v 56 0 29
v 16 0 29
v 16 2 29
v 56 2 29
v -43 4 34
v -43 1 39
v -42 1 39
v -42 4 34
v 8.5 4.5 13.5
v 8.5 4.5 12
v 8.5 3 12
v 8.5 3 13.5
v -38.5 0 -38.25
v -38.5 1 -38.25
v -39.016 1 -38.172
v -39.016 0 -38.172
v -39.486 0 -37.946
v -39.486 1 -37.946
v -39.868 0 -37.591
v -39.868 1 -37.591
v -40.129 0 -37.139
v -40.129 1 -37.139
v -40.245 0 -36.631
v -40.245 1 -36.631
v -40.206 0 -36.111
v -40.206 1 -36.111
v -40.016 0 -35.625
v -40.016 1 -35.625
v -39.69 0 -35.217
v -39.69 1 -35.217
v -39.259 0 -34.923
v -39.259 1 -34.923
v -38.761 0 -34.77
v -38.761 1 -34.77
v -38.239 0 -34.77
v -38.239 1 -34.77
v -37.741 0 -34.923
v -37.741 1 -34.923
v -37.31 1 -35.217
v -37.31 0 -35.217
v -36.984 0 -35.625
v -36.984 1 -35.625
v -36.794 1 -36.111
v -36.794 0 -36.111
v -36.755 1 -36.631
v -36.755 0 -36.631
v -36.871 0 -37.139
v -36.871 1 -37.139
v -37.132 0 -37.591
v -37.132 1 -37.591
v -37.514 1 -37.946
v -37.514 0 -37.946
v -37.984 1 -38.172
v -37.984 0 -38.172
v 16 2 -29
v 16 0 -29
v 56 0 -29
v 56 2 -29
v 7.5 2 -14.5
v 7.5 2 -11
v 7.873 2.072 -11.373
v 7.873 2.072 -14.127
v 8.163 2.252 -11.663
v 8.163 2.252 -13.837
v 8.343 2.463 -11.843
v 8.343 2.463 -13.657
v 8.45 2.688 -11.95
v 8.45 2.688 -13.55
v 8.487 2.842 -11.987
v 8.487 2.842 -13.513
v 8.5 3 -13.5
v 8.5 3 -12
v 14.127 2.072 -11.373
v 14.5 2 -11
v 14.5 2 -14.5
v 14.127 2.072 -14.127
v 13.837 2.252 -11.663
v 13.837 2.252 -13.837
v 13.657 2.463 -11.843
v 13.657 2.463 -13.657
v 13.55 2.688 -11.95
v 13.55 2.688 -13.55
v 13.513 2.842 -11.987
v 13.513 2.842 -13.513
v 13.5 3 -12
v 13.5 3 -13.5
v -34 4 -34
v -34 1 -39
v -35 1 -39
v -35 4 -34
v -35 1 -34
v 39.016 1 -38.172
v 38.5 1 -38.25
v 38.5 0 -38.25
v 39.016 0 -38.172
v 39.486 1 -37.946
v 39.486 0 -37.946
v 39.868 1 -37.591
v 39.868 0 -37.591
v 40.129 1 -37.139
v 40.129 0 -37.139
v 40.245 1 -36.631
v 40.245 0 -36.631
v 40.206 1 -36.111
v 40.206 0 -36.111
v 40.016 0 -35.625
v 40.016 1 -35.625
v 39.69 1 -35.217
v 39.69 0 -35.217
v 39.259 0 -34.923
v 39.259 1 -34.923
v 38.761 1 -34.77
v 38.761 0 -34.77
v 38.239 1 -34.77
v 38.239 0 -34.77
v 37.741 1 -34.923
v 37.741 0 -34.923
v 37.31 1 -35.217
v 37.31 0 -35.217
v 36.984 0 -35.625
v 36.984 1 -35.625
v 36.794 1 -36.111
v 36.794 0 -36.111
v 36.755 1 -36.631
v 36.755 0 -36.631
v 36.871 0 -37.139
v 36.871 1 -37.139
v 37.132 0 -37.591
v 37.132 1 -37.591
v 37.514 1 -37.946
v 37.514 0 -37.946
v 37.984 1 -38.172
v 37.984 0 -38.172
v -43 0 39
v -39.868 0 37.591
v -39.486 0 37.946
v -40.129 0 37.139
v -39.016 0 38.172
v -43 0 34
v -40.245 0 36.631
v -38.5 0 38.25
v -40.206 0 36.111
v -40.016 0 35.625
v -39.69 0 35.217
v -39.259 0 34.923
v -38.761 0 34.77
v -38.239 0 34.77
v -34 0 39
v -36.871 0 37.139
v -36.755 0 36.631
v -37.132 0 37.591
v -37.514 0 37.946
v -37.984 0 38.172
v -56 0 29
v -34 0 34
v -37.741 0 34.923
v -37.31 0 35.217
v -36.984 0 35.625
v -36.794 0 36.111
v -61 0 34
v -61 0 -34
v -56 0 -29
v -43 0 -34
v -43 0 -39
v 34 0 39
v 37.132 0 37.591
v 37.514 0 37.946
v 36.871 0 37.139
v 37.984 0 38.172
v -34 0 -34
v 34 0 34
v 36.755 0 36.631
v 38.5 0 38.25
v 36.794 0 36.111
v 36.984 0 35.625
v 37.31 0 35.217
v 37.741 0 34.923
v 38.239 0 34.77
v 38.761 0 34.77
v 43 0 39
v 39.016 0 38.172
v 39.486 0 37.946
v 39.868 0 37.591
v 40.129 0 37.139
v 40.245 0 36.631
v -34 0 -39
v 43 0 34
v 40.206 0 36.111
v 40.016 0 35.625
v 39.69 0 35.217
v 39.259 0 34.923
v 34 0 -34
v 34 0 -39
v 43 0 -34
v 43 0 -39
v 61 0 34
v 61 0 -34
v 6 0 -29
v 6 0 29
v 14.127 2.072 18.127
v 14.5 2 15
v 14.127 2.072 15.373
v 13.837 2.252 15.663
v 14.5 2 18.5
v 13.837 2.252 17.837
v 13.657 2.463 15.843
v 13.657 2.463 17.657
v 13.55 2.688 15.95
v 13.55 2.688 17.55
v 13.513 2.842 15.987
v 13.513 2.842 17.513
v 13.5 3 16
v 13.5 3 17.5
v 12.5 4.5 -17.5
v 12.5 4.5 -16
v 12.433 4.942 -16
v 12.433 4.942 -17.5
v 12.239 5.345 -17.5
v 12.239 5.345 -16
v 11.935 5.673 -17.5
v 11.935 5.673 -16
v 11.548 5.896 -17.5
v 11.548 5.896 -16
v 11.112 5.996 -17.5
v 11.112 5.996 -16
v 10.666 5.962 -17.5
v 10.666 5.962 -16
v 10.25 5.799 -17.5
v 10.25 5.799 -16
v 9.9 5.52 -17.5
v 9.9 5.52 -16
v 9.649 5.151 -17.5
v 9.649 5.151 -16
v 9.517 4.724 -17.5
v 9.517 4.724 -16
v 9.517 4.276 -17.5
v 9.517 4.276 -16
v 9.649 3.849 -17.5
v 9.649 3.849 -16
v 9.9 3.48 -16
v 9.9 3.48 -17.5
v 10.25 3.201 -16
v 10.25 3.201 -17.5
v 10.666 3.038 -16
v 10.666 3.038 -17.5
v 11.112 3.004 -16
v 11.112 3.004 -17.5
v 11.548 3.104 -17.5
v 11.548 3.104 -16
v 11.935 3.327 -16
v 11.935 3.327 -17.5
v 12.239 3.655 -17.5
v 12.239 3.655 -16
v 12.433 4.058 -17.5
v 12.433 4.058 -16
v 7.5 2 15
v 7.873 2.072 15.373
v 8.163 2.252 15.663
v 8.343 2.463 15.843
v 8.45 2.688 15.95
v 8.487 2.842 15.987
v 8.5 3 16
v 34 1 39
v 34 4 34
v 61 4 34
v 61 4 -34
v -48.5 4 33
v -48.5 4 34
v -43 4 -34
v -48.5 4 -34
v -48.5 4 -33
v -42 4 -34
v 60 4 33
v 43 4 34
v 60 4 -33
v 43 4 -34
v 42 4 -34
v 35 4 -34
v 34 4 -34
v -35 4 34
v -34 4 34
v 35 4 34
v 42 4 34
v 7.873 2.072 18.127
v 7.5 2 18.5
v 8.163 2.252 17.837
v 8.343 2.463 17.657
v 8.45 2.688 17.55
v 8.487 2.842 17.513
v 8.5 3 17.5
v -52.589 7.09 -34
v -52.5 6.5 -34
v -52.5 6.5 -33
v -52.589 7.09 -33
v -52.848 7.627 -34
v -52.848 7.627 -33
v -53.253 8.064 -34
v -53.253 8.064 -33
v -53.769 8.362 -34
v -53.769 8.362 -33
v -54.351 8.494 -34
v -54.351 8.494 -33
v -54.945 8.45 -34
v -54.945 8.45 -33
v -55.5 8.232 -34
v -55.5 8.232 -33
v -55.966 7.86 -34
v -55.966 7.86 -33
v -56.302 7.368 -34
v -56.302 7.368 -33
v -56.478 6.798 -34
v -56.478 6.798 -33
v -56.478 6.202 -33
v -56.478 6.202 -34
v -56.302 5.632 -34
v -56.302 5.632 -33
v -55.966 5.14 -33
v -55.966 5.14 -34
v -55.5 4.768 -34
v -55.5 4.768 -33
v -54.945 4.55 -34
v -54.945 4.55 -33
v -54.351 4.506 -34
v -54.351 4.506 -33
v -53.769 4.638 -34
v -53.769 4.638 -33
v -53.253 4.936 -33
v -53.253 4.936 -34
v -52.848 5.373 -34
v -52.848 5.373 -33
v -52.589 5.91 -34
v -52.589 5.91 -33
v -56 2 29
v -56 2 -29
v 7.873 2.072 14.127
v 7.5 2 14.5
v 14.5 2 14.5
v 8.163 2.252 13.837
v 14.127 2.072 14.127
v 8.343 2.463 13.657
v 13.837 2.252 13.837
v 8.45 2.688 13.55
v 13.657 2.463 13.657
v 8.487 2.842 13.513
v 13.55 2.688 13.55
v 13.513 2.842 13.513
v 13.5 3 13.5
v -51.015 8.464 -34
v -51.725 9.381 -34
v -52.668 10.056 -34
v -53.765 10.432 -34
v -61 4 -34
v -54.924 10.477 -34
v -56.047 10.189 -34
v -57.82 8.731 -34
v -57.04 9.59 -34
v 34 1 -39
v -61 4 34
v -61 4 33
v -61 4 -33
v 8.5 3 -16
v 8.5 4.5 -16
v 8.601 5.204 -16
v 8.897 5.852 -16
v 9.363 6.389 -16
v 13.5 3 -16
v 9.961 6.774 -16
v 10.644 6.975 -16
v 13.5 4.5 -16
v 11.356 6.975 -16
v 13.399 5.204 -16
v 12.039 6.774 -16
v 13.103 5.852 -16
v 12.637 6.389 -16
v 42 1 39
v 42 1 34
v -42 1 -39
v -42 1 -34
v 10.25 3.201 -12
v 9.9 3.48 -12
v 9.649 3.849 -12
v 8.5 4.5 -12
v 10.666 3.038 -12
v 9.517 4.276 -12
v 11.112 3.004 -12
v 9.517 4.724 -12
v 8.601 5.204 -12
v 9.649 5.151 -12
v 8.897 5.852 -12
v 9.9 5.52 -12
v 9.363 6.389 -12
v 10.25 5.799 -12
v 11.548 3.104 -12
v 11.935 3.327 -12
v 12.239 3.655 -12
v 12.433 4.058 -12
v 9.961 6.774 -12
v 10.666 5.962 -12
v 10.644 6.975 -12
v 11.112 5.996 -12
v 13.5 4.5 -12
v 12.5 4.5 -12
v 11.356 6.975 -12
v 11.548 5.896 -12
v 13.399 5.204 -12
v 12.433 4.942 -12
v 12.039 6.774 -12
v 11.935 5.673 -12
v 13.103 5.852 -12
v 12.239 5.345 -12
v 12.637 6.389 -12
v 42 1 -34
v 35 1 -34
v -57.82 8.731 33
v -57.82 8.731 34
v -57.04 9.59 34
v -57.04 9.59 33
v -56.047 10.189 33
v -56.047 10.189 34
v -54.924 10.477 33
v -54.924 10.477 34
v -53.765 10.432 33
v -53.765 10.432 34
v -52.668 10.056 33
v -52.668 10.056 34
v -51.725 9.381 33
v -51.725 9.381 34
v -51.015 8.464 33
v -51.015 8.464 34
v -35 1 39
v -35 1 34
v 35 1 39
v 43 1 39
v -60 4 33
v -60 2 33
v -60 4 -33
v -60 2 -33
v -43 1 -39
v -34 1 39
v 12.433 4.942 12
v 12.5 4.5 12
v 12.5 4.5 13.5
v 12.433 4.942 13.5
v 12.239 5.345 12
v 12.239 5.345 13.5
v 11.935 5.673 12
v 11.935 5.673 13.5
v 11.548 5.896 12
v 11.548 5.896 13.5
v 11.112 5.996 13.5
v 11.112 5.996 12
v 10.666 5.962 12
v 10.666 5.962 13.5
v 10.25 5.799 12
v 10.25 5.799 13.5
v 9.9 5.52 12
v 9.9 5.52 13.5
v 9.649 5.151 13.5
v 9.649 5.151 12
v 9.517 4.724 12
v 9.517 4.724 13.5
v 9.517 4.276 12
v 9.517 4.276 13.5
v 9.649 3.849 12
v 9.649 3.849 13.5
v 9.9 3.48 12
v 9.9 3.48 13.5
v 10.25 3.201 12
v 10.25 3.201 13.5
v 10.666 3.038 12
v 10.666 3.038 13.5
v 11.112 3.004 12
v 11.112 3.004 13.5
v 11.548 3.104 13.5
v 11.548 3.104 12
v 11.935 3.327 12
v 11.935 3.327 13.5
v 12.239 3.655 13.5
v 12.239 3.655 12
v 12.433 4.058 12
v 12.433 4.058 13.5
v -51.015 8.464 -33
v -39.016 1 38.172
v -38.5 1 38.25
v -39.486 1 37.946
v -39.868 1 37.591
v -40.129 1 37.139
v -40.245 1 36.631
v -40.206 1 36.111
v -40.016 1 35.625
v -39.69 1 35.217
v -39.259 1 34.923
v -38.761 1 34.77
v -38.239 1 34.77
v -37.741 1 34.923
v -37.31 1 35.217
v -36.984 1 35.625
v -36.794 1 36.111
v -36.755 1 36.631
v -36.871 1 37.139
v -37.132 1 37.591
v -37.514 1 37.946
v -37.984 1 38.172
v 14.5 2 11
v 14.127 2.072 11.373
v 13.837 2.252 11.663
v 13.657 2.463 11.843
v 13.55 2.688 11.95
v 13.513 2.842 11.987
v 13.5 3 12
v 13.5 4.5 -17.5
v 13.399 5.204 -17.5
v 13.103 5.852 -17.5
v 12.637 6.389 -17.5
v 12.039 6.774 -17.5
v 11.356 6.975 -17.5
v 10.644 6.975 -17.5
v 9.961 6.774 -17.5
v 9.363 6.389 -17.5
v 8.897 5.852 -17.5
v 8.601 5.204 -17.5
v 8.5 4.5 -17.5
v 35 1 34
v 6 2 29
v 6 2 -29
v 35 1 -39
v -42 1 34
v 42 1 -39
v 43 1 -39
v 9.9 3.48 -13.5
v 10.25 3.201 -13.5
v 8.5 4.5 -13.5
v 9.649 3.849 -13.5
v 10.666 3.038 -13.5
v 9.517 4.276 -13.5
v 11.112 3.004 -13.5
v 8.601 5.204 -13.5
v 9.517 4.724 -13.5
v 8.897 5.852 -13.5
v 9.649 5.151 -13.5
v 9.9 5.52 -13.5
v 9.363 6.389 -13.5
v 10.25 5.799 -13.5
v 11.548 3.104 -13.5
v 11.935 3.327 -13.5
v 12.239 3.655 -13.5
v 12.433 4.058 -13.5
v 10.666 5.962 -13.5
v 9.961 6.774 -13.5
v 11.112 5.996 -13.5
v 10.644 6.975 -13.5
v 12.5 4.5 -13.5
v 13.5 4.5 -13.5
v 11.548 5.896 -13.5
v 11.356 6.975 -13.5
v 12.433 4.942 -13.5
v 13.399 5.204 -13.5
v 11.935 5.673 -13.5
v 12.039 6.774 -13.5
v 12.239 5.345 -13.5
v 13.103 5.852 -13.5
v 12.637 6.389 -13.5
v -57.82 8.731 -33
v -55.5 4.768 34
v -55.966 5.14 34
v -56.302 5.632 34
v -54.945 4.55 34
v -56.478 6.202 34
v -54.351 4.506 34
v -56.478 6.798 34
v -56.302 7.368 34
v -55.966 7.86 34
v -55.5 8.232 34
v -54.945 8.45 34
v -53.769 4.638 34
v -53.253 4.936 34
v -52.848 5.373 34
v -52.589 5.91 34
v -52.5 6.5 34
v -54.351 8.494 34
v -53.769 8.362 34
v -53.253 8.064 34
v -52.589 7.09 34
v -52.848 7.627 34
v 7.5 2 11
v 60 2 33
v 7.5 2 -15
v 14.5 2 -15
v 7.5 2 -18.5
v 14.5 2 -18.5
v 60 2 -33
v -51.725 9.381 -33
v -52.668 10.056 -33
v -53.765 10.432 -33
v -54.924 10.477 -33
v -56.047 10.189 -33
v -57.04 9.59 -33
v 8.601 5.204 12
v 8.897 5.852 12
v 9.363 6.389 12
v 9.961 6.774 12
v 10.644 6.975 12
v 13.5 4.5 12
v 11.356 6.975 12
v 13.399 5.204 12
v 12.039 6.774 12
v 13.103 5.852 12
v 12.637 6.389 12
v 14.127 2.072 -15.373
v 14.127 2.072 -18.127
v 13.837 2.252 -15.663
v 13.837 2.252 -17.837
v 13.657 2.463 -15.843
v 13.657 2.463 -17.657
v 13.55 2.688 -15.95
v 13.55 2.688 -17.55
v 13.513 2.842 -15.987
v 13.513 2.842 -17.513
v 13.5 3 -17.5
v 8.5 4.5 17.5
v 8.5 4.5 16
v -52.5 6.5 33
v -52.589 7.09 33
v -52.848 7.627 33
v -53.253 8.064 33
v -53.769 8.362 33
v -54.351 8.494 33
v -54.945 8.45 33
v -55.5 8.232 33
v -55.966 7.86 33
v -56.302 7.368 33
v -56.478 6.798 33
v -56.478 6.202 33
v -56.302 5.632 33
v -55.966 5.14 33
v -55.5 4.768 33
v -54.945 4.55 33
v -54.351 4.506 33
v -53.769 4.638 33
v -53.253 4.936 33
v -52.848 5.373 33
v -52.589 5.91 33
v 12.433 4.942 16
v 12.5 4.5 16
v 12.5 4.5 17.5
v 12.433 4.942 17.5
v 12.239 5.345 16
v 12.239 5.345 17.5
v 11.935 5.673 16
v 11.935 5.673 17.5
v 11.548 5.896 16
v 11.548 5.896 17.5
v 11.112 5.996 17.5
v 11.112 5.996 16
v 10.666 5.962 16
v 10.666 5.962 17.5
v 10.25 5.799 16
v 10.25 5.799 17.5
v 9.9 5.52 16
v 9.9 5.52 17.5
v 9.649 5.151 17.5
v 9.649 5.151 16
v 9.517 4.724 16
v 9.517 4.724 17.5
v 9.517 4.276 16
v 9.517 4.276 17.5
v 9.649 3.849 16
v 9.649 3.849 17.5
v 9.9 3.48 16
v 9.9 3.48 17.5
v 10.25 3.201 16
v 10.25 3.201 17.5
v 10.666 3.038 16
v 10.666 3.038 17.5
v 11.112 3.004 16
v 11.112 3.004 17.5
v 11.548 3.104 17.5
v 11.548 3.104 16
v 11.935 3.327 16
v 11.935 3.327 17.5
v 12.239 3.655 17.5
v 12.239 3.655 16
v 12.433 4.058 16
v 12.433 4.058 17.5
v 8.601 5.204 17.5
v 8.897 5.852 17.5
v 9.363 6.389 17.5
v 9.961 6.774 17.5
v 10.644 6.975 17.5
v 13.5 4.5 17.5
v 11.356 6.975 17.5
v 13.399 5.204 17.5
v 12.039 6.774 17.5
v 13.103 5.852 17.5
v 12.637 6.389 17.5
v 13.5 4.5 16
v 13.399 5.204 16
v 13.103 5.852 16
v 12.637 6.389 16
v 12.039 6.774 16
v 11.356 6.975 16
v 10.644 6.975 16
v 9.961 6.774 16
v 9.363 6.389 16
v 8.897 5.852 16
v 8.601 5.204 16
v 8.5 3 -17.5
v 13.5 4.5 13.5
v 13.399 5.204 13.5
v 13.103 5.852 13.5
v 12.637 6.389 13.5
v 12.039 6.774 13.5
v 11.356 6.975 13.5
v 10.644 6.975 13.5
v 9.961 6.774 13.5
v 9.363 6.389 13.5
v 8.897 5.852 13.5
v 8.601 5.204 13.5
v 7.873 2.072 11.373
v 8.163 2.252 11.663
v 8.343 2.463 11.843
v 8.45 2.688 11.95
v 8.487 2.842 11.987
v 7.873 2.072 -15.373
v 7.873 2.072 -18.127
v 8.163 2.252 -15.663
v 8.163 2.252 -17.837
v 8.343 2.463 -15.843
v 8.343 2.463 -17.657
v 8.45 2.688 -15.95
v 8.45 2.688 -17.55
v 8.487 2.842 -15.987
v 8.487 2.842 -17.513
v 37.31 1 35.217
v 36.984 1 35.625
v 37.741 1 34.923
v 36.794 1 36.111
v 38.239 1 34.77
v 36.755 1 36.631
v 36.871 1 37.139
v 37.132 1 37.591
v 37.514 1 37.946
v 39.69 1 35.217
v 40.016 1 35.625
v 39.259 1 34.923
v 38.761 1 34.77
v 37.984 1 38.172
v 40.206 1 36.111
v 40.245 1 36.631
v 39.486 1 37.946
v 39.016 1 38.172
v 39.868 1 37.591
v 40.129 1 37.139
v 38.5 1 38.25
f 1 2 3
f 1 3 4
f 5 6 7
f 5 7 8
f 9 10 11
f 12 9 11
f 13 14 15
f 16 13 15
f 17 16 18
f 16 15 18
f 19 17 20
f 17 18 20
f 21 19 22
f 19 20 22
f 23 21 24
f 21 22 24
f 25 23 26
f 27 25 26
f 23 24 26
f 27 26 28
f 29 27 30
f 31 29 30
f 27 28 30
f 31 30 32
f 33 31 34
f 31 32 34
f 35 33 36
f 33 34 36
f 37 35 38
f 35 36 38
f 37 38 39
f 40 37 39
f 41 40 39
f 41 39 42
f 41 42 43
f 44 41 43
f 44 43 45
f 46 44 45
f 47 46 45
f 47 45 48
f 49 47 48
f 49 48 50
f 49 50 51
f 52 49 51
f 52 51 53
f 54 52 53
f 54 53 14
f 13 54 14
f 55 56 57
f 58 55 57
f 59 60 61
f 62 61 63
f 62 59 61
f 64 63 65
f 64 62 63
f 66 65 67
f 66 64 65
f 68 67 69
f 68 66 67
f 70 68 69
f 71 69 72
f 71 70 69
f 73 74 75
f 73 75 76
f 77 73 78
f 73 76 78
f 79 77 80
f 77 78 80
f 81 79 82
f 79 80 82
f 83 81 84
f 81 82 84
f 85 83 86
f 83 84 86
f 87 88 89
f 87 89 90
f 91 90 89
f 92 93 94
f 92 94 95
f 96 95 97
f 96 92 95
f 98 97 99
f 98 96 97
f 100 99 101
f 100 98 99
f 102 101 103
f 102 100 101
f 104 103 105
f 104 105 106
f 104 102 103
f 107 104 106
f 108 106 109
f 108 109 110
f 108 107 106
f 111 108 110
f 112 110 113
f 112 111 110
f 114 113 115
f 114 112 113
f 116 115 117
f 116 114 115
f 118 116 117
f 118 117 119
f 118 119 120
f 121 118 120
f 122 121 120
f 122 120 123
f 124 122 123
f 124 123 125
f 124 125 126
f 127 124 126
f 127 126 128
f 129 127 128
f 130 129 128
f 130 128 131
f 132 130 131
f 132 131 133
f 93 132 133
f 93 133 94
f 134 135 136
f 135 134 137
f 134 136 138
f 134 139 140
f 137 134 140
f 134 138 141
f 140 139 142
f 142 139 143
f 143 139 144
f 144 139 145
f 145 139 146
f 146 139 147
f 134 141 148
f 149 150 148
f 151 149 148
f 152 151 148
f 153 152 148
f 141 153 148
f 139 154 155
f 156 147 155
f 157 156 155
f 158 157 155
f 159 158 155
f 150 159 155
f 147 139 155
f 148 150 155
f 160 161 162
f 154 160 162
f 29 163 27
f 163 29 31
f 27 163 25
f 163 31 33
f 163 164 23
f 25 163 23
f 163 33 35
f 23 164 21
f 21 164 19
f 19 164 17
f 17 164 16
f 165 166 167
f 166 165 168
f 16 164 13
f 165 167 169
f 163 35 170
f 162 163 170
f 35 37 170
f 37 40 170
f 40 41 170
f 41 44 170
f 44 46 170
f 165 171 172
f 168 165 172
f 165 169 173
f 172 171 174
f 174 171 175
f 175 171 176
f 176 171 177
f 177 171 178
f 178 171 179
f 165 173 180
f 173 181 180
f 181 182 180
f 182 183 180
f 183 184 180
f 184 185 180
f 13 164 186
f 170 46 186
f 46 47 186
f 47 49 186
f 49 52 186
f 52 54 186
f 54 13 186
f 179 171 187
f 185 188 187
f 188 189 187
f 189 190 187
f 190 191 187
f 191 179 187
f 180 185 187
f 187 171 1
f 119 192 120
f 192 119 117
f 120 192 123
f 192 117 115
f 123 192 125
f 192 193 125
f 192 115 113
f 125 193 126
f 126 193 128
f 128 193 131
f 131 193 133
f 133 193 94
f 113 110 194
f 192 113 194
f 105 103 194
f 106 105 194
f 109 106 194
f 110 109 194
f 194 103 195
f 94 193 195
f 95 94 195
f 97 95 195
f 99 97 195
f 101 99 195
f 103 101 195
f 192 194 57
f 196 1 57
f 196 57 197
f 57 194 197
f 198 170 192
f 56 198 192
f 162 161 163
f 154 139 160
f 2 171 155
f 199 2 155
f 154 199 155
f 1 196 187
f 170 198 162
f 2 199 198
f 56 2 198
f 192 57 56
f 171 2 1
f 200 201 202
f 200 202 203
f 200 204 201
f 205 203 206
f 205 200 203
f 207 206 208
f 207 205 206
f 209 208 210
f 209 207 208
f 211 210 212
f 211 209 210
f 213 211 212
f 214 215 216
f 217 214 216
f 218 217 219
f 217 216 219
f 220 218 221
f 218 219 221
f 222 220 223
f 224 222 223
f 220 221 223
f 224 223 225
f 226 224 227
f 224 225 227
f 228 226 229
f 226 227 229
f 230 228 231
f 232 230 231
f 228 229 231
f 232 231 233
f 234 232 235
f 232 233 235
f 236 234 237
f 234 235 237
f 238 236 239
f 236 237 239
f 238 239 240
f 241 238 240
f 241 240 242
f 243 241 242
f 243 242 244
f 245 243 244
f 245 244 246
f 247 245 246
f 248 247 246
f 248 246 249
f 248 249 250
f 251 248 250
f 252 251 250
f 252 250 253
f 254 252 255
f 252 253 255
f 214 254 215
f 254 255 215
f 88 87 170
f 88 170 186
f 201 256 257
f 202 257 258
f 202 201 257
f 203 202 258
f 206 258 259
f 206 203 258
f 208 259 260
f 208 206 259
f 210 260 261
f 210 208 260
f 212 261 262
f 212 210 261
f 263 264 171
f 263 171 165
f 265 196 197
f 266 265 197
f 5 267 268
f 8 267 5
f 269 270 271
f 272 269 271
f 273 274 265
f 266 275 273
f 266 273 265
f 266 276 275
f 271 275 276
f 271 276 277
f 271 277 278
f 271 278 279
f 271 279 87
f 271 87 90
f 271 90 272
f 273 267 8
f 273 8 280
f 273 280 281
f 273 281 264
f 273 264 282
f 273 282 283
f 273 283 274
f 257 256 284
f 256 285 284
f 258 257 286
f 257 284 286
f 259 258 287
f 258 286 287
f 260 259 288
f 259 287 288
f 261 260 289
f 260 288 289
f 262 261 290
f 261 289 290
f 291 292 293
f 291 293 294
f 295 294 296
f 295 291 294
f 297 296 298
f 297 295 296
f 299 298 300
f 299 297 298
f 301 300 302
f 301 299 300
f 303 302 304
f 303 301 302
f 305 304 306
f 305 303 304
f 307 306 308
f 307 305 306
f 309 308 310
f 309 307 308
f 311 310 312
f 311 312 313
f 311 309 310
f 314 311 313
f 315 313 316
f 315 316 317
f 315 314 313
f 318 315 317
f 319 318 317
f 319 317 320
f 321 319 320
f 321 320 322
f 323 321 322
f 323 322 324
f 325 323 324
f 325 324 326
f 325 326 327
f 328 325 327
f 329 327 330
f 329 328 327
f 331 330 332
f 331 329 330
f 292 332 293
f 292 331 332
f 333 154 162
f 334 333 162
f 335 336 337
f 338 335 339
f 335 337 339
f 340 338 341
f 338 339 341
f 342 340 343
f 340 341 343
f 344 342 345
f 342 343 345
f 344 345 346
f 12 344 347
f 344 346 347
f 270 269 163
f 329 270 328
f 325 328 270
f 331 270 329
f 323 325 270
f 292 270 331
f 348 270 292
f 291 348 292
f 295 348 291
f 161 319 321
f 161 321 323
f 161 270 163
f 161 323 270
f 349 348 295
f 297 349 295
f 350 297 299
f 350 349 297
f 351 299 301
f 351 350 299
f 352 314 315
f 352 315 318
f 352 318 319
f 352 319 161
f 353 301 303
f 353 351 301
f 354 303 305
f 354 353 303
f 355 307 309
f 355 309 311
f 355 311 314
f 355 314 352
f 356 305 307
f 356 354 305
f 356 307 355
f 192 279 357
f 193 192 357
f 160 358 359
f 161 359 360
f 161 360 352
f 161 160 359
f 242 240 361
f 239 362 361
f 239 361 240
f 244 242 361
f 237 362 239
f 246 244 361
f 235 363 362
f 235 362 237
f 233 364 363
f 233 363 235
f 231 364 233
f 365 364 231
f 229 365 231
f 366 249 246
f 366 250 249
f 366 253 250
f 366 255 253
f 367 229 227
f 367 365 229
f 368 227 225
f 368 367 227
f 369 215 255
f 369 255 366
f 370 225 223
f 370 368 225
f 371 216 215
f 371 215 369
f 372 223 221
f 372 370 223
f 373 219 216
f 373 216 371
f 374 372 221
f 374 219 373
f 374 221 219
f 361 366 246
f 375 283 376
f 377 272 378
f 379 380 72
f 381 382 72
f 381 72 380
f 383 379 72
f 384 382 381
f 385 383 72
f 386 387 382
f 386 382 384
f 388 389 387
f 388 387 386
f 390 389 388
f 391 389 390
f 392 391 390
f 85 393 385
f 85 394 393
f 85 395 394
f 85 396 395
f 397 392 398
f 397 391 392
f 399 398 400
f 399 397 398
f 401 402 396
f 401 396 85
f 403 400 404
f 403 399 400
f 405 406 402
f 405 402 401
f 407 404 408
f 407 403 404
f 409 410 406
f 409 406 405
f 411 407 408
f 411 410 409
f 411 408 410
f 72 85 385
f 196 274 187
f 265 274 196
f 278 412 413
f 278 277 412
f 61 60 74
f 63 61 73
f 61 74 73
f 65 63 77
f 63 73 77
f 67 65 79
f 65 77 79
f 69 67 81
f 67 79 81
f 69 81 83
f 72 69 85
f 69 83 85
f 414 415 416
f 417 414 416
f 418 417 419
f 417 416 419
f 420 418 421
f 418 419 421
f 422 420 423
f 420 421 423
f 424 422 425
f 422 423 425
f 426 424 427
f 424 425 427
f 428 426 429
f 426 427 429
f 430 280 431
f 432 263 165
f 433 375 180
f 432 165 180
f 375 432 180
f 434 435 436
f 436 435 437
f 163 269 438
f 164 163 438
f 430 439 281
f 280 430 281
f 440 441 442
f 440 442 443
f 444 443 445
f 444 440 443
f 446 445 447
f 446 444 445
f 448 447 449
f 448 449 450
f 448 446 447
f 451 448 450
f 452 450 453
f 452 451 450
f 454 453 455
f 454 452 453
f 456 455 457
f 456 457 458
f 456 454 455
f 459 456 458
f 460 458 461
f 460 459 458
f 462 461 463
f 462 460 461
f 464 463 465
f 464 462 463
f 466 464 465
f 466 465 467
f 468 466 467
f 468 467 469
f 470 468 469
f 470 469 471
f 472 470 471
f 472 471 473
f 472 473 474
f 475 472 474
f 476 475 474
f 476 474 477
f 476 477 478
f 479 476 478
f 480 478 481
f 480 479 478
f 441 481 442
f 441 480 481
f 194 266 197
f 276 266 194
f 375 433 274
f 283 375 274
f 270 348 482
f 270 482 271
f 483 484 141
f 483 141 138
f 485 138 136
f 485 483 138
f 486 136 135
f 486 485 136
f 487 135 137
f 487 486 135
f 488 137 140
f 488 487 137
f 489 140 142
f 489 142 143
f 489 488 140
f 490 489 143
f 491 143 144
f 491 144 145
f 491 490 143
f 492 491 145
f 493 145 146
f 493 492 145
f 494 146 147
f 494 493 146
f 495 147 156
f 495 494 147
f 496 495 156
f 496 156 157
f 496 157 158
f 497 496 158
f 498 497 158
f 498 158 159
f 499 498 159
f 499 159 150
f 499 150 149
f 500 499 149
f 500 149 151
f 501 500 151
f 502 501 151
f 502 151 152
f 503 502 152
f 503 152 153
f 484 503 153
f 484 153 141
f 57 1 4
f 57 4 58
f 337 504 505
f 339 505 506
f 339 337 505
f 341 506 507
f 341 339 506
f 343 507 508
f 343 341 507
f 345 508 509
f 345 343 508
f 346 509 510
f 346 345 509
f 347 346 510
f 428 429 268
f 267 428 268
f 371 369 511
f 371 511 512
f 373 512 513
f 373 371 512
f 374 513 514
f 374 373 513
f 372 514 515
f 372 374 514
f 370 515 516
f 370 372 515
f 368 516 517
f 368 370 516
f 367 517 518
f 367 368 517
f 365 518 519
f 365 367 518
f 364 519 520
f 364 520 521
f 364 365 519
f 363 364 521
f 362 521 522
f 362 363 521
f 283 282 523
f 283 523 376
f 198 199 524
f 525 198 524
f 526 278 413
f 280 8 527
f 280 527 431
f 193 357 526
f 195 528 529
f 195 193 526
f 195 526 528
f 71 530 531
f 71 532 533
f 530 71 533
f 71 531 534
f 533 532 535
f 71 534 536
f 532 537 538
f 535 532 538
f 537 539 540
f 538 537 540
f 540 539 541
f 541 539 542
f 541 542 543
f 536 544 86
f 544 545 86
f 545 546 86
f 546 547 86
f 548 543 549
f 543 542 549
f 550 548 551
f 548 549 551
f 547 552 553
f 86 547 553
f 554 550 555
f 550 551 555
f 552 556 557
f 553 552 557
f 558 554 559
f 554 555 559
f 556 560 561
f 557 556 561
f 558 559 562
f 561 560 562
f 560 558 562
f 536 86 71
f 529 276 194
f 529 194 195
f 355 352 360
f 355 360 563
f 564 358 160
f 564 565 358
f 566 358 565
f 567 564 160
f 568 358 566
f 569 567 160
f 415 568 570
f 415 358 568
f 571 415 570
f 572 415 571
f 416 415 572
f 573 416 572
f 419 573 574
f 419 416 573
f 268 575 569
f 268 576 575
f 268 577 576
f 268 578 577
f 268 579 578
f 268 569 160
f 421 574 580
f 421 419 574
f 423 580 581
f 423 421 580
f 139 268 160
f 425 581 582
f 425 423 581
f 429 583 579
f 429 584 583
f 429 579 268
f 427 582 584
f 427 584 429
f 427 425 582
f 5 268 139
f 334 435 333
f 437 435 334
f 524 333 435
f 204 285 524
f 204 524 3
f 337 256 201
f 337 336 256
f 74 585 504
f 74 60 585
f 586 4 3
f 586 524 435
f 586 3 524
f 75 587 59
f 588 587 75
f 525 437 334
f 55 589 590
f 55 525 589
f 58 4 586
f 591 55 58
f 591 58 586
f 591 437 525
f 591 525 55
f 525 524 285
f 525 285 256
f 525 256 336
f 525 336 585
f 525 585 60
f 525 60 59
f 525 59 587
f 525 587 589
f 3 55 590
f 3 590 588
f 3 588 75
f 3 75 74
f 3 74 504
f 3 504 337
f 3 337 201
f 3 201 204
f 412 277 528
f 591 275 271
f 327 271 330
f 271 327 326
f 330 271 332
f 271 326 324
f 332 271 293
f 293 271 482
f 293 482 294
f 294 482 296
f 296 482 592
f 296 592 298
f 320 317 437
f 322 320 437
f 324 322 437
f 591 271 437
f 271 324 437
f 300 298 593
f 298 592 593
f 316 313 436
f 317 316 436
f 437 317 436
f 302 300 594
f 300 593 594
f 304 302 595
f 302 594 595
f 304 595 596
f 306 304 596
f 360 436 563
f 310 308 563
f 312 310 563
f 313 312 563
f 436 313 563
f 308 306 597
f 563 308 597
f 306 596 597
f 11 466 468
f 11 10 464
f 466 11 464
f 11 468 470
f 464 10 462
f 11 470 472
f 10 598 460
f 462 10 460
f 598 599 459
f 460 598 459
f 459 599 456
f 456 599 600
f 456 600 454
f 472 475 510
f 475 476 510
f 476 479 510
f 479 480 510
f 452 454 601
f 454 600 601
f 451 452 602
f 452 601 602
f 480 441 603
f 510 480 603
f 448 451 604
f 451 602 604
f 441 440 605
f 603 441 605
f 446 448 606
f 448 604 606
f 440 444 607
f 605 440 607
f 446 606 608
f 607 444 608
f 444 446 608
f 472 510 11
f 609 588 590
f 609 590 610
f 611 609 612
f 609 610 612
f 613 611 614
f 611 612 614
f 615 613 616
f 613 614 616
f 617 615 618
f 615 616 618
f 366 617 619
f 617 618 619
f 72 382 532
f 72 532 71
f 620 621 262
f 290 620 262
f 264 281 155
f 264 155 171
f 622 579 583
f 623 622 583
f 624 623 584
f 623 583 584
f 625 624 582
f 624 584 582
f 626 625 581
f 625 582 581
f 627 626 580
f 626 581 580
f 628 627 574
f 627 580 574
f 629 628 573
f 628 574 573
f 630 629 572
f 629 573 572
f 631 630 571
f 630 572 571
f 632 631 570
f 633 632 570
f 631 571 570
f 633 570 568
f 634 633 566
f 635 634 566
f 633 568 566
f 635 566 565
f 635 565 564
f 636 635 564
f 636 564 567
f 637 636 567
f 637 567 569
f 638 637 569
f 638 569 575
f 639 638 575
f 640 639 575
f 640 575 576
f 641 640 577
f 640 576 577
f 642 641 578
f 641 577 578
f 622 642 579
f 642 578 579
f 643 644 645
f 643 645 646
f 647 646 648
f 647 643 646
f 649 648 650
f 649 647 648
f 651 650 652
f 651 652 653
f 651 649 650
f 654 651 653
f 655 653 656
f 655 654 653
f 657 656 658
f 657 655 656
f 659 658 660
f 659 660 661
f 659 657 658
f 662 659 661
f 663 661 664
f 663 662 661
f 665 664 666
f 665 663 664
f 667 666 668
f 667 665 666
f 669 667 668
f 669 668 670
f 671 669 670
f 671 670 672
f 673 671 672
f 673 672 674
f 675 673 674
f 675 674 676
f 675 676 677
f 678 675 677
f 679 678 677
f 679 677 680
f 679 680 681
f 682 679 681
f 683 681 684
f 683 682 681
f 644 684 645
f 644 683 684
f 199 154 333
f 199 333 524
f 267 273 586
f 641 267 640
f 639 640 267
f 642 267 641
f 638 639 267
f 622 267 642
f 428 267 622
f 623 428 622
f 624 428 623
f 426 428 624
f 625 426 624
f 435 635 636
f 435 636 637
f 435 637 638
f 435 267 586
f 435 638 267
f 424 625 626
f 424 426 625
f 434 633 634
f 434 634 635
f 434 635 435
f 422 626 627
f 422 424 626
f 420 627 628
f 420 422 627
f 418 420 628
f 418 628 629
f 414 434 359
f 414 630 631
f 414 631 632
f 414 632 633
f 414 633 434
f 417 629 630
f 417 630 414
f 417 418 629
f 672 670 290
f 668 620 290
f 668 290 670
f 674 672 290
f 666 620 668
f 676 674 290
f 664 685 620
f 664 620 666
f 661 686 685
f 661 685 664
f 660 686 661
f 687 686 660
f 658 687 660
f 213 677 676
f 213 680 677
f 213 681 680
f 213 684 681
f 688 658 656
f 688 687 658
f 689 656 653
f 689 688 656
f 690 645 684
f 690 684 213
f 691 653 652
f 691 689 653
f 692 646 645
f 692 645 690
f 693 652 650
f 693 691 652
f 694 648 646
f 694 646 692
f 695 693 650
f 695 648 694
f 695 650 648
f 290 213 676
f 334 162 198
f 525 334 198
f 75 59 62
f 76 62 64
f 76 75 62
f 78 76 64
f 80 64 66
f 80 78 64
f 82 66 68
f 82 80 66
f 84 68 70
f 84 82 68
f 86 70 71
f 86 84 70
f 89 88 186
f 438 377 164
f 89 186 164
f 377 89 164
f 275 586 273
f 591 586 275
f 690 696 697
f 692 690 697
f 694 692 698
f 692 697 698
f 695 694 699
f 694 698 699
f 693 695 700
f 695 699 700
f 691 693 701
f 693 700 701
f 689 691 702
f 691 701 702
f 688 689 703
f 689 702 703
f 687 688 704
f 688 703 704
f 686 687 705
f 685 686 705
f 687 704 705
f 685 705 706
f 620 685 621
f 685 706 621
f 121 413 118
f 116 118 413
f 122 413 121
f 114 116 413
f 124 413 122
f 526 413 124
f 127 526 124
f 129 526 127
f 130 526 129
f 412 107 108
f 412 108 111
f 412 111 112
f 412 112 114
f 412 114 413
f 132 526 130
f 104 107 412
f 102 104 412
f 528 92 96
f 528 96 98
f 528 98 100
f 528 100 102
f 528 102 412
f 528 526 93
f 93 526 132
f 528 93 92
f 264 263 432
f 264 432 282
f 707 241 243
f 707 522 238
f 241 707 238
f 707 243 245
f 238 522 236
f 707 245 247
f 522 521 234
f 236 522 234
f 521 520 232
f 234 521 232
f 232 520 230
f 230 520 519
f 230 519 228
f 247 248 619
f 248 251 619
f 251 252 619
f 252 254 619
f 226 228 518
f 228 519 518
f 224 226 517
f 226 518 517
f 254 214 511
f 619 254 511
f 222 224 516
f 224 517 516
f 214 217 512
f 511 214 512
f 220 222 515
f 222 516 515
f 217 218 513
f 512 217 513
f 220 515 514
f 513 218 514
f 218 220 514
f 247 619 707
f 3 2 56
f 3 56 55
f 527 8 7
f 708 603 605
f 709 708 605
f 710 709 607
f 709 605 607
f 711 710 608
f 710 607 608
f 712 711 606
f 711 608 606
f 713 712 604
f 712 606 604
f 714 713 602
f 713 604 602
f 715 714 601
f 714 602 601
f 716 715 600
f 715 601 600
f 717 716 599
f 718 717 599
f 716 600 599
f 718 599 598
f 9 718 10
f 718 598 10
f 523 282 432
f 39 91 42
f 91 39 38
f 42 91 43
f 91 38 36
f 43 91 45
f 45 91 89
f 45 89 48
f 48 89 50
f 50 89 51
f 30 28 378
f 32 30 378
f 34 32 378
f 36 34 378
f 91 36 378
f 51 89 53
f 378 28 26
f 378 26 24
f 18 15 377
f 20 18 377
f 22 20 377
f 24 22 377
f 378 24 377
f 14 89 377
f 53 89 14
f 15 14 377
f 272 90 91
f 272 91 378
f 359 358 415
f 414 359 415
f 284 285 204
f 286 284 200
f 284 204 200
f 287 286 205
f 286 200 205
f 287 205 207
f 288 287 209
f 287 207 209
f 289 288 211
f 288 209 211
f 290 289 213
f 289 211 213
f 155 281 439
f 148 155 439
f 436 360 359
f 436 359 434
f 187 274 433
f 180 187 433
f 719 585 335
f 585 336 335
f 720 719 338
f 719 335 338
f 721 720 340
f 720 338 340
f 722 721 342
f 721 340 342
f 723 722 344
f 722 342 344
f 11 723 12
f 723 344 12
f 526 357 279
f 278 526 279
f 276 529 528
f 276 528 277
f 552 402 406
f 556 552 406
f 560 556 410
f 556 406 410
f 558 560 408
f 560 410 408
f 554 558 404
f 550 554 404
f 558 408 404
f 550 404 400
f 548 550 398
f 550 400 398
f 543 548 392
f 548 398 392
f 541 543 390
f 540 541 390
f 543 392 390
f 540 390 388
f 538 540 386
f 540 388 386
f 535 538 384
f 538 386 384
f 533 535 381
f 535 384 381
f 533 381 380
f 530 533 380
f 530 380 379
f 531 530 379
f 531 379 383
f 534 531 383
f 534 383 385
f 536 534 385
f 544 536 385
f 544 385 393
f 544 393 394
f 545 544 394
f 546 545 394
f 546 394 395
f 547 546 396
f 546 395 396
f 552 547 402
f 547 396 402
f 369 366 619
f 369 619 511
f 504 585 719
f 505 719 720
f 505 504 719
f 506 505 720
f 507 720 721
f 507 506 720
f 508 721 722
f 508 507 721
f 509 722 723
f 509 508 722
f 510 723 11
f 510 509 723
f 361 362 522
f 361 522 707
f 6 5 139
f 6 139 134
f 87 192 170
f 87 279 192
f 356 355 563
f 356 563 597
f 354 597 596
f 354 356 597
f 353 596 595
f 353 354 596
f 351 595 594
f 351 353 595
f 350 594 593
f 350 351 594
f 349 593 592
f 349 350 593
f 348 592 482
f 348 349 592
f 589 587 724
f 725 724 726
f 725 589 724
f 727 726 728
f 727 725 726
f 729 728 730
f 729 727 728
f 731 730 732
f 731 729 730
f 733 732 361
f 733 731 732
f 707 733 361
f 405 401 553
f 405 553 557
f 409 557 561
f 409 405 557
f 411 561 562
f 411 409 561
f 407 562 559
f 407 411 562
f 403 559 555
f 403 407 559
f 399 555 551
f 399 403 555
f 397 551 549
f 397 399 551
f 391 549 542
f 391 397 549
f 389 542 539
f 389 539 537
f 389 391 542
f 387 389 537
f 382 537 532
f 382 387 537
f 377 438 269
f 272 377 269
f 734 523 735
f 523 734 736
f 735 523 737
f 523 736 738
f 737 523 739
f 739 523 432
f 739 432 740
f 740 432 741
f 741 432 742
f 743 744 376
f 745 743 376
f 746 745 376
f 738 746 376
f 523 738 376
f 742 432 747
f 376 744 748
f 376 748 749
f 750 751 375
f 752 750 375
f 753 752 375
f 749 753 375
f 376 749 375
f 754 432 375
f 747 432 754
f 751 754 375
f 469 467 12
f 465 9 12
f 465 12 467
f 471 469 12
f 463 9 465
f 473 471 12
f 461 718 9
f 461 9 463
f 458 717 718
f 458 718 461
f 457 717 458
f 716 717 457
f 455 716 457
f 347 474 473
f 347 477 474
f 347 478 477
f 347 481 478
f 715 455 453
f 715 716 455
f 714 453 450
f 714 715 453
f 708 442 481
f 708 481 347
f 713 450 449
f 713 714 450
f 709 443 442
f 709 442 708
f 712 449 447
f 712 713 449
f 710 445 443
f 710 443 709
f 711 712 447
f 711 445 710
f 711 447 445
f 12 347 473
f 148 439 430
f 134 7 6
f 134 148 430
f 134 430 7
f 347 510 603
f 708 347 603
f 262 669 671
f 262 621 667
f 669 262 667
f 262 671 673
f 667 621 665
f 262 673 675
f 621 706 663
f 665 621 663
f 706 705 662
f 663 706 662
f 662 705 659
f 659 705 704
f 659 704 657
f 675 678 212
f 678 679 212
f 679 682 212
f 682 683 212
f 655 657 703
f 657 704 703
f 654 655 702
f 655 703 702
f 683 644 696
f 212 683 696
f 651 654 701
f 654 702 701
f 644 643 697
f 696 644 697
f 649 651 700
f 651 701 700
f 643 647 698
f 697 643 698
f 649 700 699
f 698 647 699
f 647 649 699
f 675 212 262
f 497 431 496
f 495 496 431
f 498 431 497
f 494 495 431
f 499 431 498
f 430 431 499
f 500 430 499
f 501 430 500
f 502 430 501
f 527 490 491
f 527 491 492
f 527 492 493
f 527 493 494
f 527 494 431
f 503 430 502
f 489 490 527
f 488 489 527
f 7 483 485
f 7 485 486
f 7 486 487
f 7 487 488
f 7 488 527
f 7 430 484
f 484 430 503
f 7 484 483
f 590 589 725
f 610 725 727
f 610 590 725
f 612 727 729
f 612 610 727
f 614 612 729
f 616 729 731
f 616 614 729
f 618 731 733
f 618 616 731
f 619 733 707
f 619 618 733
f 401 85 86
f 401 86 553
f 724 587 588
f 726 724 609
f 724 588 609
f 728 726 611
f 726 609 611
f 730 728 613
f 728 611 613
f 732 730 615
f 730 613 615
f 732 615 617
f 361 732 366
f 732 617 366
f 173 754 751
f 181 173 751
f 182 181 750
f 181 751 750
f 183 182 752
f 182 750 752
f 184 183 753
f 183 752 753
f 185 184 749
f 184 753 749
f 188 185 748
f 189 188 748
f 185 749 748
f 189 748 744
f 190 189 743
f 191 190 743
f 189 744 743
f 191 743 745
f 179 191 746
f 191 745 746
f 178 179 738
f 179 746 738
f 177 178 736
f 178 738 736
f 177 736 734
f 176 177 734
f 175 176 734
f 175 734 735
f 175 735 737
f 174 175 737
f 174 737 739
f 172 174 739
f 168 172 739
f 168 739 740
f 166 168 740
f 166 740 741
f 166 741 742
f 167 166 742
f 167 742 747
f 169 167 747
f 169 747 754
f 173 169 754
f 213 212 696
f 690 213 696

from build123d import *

# Parameters (mm, degrees)
SKETCH_2_W               = 120
SKETCH_2_H               = 66
SKETCH_2_W_2             = 112
SKETCH_2_H_2             = 58
EXTRUDE_1_DEPTH          = 2
SKETCH_2_2_W             = 122
SKETCH_2_2_H             = 68
SKETCH_2_2_W_2           = 120
SKETCH_2_2_H_2           = 66
EXTRUDE_1_2_DEPTH        = 4
SKETCH_3_R               = 2
EXTRUDE_2_DEPTH          = 1
SKETCH_4_W               = 10
SKETCH_4_H               = 2
EXTRUDE_3_DEPTH          = 68
EXTRUDE_START            = 12
SKETCH_5_R               = 1.5
EXTRUDE_4_DEPTH          = 1.5
EXTRUDE_START_2          = 16
SKETCH_5_3_R             = 1.5
EXTRUDE_6_DEPTH          = 1.5
FILLET_2_R               = 1
FILLET_2_OF_MIRROR_3_R   = 1
SKETCH_7_W               = 9
SKETCH_7_H               = 5
EXTRUDE_7_DEPTH          = 1
EXTRUDE_8_DEPTH          = 1
EXTRUDE_9_DEPTH          = 1
CUT_EXTRUDE_1_REACH      = 75.022
SKETCH_10_R              = 1.75
MIRROR_6_COPY_1_SKETCH_W = 9
MIRROR_6_COPY_1_SKETCH_H = 5
MIRROR_6_COPY_1_DEPTH    = 1
MIRROR_6_COPY_2_DEPTH    = 1
MIRROR_6_COPY_3_DEPTH    = 1
MIRROR_6_COPY_4_REACH    = 75.022
MIRROR_6_COPY_4_SKETCH_R = 1.75


with BuildPart() as part:
    # 草圖2 → Extrude 1 (new body)
    with BuildSketch(Plane(origin=(0, 0, 0), x_dir=(1, 0, 0), z_dir=(0, 1, 0))):
        Rectangle(SKETCH_2_W, SKETCH_2_H)
        Rectangle(SKETCH_2_W_2, SKETCH_2_H_2, mode=Mode.SUBTRACT)
    extrude(amount=EXTRUDE_1_DEPTH)

    # 草圖2<2> → Extrude 1 2 (add)
    with BuildSketch(Plane(origin=(0, 0, 0), x_dir=(1, 0, 0), z_dir=(0, 1, 0))):
        Rectangle(SKETCH_2_2_W, SKETCH_2_2_H)
        Rectangle(SKETCH_2_2_W_2, SKETCH_2_2_H_2, mode=Mode.SUBTRACT)
    extrude(amount=EXTRUDE_1_2_DEPTH)

    # 草圖3 → 填料-伸長2 (add)
    with BuildSketch(Plane.XY.offset(34)):
        with BuildLine():
            Line((-61, 4), (-57.819768479, 8.731398047))
            ThreePointArc((-57.819768479, 8.731398047), (-54.342718511, 10.496906621), (-51.015153756, 8.463630987))
            Line((-51.015153756, 8.463630987), (-48.5, 4))
            Line((-48.5, 4), (-61, 4))
        make_face()
        with Locations((-54.5, 6.5)):
            Circle(SKETCH_3_R, mode=Mode.SUBTRACT)
    extrude_2 = extrude(amount=-EXTRUDE_2_DEPTH)

    # 鏡射1: 填料-伸長2 across plane
    add(extrude_2.mirror(Plane.XY))

    # 草圖4 → 填料-伸長3 (add)
    with BuildSketch(Plane.XY.offset(34)):
        with Locations((11, 1)):
            Rectangle(SKETCH_4_W, SKETCH_4_H)
    extrude(amount=-EXTRUDE_3_DEPTH)

    # 草圖5 → 填料-伸長4 (add)
    with BuildSketch(Plane.XY.offset(EXTRUDE_START)):
        with BuildLine():
            Line((8.5, 4.5), (8.5, 2))
            Line((8.5, 2), (13.5, 2))
            Line((13.5, 2), (13.5, 4.5))
            ThreePointArc((13.5, 4.5), (11, 7), (8.5, 4.5))
        make_face()
        with Locations((11, 4.5)):
            Circle(SKETCH_5_R, mode=Mode.SUBTRACT)
    extrude_4 = extrude(amount=EXTRUDE_4_DEPTH)

    # 草圖5<3> → 填料-伸長6 (add)
    with BuildSketch(Plane.XY.offset(EXTRUDE_START_2)):
        with BuildLine():
            Line((8.5, 4.5), (8.5, 2))
            Line((8.5, 2), (13.5, 2))
            Line((13.5, 2), (13.5, 4.5))
            ThreePointArc((13.5, 4.5), (11, 7), (8.5, 4.5))
        make_face()
        with Locations((11, 4.5)):
            Circle(SKETCH_5_3_R, mode=Mode.SUBTRACT)
    extrude_6 = extrude(amount=EXTRUDE_6_DEPTH)

    # 圓角2
    fillet_2_edges = [part.edges().sort_by_distance(p)[0] for p in [
        (11, 2, 13.5),
        (11, 2, 12),
        (8.5, 2, 12.75),
        (13.5, 2, 12.75),
        (11, 2, 17.5),
        (11, 2, 16),
        (8.5, 2, 16.75),
        (13.5, 2, 16.75),
    ]]
    fillet(fillet_2_edges, radius=FILLET_2_R - 0.0001)  # a hair under: the kernel refuses the full size

    # 鏡射3: 填料-伸長4, 填料-伸長6 across plane
    add(extrude_4.mirror(Plane.XY))
    add(extrude_6.mirror(Plane.XY))

    # 圓角2 of 鏡射3
    fillet_2_of_mirror_3_edges = [part.edges().sort_by_distance(p)[0] for p in [
        (11, 2, -13.5),
        (11, 2, -12),
        (8.5, 2, -12.75),
        (13.5, 2, -12.75),
        (11, 2, -17.5),
        (11, 2, -16),
        (8.5, 2, -16.75),
        (13.5, 2, -16.75),
    ]]
    fillet(fillet_2_of_mirror_3_edges, radius=FILLET_2_OF_MIRROR_3_R - 0.0001)  # a hair under: the kernel refuses the full size

    # 草圖7 → 填料-伸長7 (add)
    with BuildSketch(Plane.XZ):
        with Locations((38.5, 36.5)):
            Rectangle(SKETCH_7_W, SKETCH_7_H)
    extrude_7 = extrude(amount=-EXTRUDE_7_DEPTH)

    # 草圖8 → 填料-伸長8 (add)
    with BuildSketch(Plane(origin=(43, 0, 0), x_dir=(0, 0, -1), z_dir=(1, 0, 0))):
        Polygon((-39, 1), (-34, 4), (-34, 1), align=None)
    extrude_8 = extrude(amount=-EXTRUDE_8_DEPTH)

    # 草圖9 → 填料-伸長9 (add)
    with BuildSketch(Plane.ZY.offset(-34)):
        Polygon((39, 1), (34, 4), (34, 1), align=None)
    extrude_9 = extrude(amount=-EXTRUDE_9_DEPTH)

    # 草圖10 → 除料-伸長1 (cut, up to next)
    with BuildSketch(Plane(origin=(0, 1, 0), x_dir=(1, 0, 0), z_dir=(0, 1, 0)), mode=Mode.PRIVATE) as cut_extrude_1_sk1:
        with Locations(Location((38.5, -36.5, 0), (0, 0, 270))):
            Circle(SKETCH_10_R)
    cut_extrude_1_tool1 = extrude(cut_extrude_1_sk1.sketch, amount=-CUT_EXTRUDE_1_REACH, mode=Mode.PRIVATE) & part.part
    cut_extrude_1 = cut_extrude_1_tool1.solids().sort_by_distance((38.5, 1, 36.5))[0]
    add(cut_extrude_1, mode=Mode.SUBTRACT)

    # 鏡射5: 填料-伸長7, 填料-伸長8, 填料-伸長9, 除料-伸長1 across plane
    add(extrude_7.mirror(Plane.XY))
    add(extrude_8.mirror(Plane.XY))
    add(extrude_9.mirror(Plane.XY))
    add(cut_extrude_1.mirror(Plane.XY), mode=Mode.SUBTRACT)

    # 鏡射6: 填料-伸長7, 填料-伸長8, 填料-伸長9, 除料-伸長1 across plane
    add(extrude_7.mirror(Plane(origin=(0, 0, 0), x_dir=(0, 0, 1), z_dir=(1, 0, 0))))
    add(extrude_8.mirror(Plane(origin=(0, 0, 0), x_dir=(0, 0, 1), z_dir=(1, 0, 0))))
    add(extrude_9.mirror(Plane(origin=(0, 0, 0), x_dir=(0, 0, 1), z_dir=(1, 0, 0))))
    add(cut_extrude_1.mirror(Plane(origin=(0, 0, 0), x_dir=(0, 0, 1), z_dir=(1, 0, 0))), mode=Mode.SUBTRACT)

    # 鏡射6 copy 1 sketch → 鏡射6 copy 1 (add)
    with BuildSketch(Plane(origin=(0, 0, 0), x_dir=(-1, 0, 0), z_dir=(0, -1, 0))):
        with Locations((38.5, 36.5)):
            Rectangle(MIRROR_6_COPY_1_SKETCH_W, MIRROR_6_COPY_1_SKETCH_H)
    extrude(amount=-MIRROR_6_COPY_1_DEPTH)

    # 鏡射6 copy 2 sketch → 鏡射6 copy 2 (add)
    with BuildSketch(Plane.ZY.offset(43)):
        Polygon((-39, 1), (-34, 4), (-34, 1), align=None)
    extrude(amount=-MIRROR_6_COPY_2_DEPTH)

    # 鏡射6 copy 3 sketch → 鏡射6 copy 3 (add)
    with BuildSketch(Plane(origin=(-34, 0, 0), x_dir=(0, 0, -1), z_dir=(1, 0, 0))):
        Polygon((39, 1), (34, 4), (34, 1), align=None)
    extrude(amount=-MIRROR_6_COPY_3_DEPTH)

    # 鏡射6 copy 4 sketch → 鏡射6 copy 4 (cut, up to next)
    with BuildSketch(Plane(origin=(0, 1, 0), x_dir=(-1, 0, 0), z_dir=(0, 1, 0)), mode=Mode.PRIVATE) as mirror_6_copy_4_sk1:
        with Locations(Location((38.5, -36.5, 0), (0, 0, 270))):
            Circle(MIRROR_6_COPY_4_SKETCH_R)
    mirror_6_copy_4_tool1 = extrude(mirror_6_copy_4_sk1.sketch, amount=-MIRROR_6_COPY_4_REACH, mode=Mode.PRIVATE) & part.part
    add(mirror_6_copy_4_tool1.solids().sort_by_distance((-38.5, 1, -36.5))[0], mode=Mode.SUBTRACT)


solid = part.part
